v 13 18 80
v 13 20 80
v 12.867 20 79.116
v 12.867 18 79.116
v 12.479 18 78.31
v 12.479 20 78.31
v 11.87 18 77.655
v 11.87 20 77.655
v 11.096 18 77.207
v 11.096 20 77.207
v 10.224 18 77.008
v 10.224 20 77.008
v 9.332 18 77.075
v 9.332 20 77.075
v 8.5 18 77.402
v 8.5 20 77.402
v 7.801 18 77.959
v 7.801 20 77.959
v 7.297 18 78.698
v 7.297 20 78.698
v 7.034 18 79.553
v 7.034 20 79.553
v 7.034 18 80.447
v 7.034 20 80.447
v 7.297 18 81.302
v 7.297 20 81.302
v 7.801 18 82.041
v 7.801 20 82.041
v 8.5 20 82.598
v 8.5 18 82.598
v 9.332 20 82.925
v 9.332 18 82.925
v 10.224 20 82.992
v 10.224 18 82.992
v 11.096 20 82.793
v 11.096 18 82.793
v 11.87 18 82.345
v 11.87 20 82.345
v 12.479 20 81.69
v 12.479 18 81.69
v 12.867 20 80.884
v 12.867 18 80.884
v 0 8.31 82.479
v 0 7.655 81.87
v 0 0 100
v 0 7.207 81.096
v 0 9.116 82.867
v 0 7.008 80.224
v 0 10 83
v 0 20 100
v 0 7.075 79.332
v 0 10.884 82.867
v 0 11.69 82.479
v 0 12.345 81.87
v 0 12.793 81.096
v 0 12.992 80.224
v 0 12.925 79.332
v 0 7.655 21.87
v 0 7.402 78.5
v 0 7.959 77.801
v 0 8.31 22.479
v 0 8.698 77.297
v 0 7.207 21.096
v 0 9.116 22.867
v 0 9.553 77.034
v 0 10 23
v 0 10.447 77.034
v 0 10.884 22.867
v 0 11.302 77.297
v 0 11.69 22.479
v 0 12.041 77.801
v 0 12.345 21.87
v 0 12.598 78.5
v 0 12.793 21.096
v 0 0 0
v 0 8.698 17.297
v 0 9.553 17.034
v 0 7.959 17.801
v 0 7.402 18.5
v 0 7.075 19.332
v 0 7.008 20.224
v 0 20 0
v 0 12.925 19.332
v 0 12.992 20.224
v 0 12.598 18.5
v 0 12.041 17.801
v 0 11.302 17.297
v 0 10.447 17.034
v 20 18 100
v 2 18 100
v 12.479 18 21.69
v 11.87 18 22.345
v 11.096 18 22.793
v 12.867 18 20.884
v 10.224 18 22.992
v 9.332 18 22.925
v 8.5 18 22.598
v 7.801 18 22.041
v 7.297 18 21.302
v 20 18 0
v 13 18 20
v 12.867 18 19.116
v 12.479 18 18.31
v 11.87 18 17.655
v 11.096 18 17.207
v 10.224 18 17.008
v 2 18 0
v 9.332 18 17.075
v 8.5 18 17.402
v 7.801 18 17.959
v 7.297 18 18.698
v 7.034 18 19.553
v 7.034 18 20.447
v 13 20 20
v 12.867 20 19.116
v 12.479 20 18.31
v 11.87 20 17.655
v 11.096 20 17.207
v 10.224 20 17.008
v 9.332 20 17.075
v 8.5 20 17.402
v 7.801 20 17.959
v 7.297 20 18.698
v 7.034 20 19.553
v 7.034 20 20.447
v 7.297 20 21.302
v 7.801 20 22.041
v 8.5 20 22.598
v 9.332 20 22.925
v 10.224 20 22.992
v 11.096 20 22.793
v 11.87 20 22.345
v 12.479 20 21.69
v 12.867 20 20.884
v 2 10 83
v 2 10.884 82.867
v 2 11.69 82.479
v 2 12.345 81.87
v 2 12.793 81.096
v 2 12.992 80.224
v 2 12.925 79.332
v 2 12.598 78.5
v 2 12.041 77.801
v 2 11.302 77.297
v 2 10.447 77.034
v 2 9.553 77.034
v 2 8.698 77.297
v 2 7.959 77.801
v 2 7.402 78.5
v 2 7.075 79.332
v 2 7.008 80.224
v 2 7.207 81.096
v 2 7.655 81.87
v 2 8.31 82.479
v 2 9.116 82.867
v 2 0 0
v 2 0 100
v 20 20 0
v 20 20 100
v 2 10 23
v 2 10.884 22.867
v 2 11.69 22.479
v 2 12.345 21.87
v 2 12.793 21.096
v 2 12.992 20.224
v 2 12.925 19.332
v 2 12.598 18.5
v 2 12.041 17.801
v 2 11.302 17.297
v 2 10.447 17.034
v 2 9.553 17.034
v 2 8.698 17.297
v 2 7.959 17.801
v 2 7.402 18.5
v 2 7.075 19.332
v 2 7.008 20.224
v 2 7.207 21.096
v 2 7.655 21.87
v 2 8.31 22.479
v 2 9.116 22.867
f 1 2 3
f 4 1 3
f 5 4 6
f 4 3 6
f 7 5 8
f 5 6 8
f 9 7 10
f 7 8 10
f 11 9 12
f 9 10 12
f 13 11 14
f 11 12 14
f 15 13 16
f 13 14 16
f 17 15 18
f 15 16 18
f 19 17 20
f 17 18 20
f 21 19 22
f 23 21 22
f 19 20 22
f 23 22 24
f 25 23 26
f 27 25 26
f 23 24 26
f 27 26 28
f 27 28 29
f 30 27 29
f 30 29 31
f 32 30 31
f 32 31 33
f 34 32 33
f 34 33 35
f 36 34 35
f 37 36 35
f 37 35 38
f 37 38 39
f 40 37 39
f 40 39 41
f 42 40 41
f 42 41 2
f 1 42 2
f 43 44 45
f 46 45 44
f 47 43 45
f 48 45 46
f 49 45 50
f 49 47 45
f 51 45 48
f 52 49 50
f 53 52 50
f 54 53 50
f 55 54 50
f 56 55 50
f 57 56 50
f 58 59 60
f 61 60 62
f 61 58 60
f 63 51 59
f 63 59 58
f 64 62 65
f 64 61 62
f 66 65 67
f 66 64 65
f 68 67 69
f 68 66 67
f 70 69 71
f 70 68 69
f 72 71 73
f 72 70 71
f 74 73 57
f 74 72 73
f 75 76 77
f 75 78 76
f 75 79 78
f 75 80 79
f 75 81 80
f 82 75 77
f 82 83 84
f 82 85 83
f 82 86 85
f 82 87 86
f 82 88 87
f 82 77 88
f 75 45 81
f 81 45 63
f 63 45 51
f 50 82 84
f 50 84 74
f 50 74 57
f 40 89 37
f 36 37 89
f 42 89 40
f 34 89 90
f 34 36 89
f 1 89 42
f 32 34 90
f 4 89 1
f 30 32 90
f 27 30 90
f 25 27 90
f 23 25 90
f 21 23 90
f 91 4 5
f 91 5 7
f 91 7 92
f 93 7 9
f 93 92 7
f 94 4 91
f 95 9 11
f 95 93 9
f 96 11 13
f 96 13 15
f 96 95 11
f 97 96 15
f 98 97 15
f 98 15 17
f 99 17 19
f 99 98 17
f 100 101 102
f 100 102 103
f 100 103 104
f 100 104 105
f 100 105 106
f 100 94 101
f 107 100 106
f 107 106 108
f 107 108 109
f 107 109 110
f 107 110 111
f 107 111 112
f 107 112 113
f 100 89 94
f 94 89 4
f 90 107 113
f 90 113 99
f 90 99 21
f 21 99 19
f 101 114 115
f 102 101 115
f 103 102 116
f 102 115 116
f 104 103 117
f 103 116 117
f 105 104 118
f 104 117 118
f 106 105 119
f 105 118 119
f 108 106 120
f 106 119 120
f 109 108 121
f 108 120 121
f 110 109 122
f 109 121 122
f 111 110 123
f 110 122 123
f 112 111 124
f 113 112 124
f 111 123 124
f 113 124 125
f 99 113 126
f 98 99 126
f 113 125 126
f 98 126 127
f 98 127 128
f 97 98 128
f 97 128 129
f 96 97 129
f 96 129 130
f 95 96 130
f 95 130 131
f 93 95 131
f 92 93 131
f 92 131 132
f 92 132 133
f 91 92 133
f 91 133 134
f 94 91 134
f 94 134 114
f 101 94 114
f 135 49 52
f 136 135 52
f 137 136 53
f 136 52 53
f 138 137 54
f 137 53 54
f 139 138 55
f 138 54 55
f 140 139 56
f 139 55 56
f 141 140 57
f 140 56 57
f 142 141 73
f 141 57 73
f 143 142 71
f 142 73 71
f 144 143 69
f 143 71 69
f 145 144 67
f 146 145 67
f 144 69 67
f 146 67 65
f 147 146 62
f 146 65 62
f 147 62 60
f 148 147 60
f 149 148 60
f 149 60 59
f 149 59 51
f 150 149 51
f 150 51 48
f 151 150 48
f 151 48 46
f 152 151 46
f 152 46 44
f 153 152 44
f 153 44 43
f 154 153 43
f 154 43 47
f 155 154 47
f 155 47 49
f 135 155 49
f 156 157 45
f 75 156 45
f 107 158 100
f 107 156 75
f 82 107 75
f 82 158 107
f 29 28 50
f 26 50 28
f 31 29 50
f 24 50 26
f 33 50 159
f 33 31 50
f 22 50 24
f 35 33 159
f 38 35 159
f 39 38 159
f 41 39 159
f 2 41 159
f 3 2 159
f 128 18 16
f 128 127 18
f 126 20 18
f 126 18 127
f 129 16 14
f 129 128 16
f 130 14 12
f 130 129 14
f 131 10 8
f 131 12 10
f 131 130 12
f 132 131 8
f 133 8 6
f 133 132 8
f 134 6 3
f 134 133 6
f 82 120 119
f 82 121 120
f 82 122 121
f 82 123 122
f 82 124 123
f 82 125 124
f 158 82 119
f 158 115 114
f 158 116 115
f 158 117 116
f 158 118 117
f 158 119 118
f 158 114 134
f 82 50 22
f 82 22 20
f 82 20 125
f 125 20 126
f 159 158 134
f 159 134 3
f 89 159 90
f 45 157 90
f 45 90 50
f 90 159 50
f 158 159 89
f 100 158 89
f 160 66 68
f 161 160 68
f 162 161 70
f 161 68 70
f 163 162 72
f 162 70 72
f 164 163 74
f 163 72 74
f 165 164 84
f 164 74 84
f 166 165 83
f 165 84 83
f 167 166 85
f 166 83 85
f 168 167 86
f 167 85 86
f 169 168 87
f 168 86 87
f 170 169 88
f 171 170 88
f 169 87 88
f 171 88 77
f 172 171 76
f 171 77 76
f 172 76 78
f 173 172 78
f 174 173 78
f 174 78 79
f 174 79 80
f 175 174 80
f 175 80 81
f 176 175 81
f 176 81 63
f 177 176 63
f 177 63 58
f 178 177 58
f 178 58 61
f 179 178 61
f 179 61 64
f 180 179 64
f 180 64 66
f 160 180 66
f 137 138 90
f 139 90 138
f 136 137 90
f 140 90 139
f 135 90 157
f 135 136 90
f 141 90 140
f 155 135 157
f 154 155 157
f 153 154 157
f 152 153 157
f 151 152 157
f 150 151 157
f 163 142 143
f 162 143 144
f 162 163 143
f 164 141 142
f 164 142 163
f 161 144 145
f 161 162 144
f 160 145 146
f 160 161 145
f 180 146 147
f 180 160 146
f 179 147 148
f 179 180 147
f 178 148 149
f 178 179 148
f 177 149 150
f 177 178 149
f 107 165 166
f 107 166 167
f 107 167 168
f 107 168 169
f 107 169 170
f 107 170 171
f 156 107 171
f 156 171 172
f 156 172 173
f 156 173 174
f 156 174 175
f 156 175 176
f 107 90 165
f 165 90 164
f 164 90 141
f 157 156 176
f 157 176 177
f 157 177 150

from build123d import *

# Parameters (mm, degrees)
BOSS_EXTRUDE1_DEPTH = 100
SKETCH3_R           = 3
CUT_EXTRUDE1_DEPTH  = 20
SKETCH4_R           = 3
CUT_EXTRUDE2_DEPTH  = 20
SKETCH5_R           = 3
CUT_EXTRUDE3_DEPTH  = 20
SKETCH6_R           = 3
CUT_EXTRUDE4_DEPTH  = 20


with BuildPart() as part:
    # Sketch2 → Boss-Extrude1 (new body)
    with BuildSketch(Plane.XY):
        Polygon((0, 0), (0, 20), (20, 20), (20, 18), (2, 18), (2, 0), align=None)
    extrude(amount=BOSS_EXTRUDE1_DEPTH)

    # Sketch3 → Cut-Extrude1 (cut)
    with BuildSketch(Plane.ZY):
        with Locations((80, 10)):
            Circle(SKETCH3_R)
    extrude(amount=-CUT_EXTRUDE1_DEPTH, mode=Mode.SUBTRACT)

    # Sketch4 → Cut-Extrude2 (cut)
    with BuildSketch(Plane.ZY):
        with Locations((20, 10)):
            Circle(SKETCH4_R)
    extrude(amount=-CUT_EXTRUDE2_DEPTH, mode=Mode.SUBTRACT)

    # Sketch5 → Cut-Extrude3 (cut)
    with BuildSketch(Plane(origin=(0, 20, 0), x_dir=(1, 0, 0), z_dir=(0, 1, 0))):
        with Locations((10, -80)):
            Circle(SKETCH5_R)
    extrude(amount=-CUT_EXTRUDE3_DEPTH, mode=Mode.SUBTRACT)

    # Sketch6 → Cut-Extrude4 (cut)
    with BuildSketch(Plane(origin=(0, 20, 0), x_dir=(1, 0, 0), z_dir=(0, 1, 0))):
        with Locations((10, -20)):
            Circle(SKETCH6_R)
    extrude(amount=-CUT_EXTRUDE4_DEPTH, mode=Mode.SUBTRACT)


solid = part.part
